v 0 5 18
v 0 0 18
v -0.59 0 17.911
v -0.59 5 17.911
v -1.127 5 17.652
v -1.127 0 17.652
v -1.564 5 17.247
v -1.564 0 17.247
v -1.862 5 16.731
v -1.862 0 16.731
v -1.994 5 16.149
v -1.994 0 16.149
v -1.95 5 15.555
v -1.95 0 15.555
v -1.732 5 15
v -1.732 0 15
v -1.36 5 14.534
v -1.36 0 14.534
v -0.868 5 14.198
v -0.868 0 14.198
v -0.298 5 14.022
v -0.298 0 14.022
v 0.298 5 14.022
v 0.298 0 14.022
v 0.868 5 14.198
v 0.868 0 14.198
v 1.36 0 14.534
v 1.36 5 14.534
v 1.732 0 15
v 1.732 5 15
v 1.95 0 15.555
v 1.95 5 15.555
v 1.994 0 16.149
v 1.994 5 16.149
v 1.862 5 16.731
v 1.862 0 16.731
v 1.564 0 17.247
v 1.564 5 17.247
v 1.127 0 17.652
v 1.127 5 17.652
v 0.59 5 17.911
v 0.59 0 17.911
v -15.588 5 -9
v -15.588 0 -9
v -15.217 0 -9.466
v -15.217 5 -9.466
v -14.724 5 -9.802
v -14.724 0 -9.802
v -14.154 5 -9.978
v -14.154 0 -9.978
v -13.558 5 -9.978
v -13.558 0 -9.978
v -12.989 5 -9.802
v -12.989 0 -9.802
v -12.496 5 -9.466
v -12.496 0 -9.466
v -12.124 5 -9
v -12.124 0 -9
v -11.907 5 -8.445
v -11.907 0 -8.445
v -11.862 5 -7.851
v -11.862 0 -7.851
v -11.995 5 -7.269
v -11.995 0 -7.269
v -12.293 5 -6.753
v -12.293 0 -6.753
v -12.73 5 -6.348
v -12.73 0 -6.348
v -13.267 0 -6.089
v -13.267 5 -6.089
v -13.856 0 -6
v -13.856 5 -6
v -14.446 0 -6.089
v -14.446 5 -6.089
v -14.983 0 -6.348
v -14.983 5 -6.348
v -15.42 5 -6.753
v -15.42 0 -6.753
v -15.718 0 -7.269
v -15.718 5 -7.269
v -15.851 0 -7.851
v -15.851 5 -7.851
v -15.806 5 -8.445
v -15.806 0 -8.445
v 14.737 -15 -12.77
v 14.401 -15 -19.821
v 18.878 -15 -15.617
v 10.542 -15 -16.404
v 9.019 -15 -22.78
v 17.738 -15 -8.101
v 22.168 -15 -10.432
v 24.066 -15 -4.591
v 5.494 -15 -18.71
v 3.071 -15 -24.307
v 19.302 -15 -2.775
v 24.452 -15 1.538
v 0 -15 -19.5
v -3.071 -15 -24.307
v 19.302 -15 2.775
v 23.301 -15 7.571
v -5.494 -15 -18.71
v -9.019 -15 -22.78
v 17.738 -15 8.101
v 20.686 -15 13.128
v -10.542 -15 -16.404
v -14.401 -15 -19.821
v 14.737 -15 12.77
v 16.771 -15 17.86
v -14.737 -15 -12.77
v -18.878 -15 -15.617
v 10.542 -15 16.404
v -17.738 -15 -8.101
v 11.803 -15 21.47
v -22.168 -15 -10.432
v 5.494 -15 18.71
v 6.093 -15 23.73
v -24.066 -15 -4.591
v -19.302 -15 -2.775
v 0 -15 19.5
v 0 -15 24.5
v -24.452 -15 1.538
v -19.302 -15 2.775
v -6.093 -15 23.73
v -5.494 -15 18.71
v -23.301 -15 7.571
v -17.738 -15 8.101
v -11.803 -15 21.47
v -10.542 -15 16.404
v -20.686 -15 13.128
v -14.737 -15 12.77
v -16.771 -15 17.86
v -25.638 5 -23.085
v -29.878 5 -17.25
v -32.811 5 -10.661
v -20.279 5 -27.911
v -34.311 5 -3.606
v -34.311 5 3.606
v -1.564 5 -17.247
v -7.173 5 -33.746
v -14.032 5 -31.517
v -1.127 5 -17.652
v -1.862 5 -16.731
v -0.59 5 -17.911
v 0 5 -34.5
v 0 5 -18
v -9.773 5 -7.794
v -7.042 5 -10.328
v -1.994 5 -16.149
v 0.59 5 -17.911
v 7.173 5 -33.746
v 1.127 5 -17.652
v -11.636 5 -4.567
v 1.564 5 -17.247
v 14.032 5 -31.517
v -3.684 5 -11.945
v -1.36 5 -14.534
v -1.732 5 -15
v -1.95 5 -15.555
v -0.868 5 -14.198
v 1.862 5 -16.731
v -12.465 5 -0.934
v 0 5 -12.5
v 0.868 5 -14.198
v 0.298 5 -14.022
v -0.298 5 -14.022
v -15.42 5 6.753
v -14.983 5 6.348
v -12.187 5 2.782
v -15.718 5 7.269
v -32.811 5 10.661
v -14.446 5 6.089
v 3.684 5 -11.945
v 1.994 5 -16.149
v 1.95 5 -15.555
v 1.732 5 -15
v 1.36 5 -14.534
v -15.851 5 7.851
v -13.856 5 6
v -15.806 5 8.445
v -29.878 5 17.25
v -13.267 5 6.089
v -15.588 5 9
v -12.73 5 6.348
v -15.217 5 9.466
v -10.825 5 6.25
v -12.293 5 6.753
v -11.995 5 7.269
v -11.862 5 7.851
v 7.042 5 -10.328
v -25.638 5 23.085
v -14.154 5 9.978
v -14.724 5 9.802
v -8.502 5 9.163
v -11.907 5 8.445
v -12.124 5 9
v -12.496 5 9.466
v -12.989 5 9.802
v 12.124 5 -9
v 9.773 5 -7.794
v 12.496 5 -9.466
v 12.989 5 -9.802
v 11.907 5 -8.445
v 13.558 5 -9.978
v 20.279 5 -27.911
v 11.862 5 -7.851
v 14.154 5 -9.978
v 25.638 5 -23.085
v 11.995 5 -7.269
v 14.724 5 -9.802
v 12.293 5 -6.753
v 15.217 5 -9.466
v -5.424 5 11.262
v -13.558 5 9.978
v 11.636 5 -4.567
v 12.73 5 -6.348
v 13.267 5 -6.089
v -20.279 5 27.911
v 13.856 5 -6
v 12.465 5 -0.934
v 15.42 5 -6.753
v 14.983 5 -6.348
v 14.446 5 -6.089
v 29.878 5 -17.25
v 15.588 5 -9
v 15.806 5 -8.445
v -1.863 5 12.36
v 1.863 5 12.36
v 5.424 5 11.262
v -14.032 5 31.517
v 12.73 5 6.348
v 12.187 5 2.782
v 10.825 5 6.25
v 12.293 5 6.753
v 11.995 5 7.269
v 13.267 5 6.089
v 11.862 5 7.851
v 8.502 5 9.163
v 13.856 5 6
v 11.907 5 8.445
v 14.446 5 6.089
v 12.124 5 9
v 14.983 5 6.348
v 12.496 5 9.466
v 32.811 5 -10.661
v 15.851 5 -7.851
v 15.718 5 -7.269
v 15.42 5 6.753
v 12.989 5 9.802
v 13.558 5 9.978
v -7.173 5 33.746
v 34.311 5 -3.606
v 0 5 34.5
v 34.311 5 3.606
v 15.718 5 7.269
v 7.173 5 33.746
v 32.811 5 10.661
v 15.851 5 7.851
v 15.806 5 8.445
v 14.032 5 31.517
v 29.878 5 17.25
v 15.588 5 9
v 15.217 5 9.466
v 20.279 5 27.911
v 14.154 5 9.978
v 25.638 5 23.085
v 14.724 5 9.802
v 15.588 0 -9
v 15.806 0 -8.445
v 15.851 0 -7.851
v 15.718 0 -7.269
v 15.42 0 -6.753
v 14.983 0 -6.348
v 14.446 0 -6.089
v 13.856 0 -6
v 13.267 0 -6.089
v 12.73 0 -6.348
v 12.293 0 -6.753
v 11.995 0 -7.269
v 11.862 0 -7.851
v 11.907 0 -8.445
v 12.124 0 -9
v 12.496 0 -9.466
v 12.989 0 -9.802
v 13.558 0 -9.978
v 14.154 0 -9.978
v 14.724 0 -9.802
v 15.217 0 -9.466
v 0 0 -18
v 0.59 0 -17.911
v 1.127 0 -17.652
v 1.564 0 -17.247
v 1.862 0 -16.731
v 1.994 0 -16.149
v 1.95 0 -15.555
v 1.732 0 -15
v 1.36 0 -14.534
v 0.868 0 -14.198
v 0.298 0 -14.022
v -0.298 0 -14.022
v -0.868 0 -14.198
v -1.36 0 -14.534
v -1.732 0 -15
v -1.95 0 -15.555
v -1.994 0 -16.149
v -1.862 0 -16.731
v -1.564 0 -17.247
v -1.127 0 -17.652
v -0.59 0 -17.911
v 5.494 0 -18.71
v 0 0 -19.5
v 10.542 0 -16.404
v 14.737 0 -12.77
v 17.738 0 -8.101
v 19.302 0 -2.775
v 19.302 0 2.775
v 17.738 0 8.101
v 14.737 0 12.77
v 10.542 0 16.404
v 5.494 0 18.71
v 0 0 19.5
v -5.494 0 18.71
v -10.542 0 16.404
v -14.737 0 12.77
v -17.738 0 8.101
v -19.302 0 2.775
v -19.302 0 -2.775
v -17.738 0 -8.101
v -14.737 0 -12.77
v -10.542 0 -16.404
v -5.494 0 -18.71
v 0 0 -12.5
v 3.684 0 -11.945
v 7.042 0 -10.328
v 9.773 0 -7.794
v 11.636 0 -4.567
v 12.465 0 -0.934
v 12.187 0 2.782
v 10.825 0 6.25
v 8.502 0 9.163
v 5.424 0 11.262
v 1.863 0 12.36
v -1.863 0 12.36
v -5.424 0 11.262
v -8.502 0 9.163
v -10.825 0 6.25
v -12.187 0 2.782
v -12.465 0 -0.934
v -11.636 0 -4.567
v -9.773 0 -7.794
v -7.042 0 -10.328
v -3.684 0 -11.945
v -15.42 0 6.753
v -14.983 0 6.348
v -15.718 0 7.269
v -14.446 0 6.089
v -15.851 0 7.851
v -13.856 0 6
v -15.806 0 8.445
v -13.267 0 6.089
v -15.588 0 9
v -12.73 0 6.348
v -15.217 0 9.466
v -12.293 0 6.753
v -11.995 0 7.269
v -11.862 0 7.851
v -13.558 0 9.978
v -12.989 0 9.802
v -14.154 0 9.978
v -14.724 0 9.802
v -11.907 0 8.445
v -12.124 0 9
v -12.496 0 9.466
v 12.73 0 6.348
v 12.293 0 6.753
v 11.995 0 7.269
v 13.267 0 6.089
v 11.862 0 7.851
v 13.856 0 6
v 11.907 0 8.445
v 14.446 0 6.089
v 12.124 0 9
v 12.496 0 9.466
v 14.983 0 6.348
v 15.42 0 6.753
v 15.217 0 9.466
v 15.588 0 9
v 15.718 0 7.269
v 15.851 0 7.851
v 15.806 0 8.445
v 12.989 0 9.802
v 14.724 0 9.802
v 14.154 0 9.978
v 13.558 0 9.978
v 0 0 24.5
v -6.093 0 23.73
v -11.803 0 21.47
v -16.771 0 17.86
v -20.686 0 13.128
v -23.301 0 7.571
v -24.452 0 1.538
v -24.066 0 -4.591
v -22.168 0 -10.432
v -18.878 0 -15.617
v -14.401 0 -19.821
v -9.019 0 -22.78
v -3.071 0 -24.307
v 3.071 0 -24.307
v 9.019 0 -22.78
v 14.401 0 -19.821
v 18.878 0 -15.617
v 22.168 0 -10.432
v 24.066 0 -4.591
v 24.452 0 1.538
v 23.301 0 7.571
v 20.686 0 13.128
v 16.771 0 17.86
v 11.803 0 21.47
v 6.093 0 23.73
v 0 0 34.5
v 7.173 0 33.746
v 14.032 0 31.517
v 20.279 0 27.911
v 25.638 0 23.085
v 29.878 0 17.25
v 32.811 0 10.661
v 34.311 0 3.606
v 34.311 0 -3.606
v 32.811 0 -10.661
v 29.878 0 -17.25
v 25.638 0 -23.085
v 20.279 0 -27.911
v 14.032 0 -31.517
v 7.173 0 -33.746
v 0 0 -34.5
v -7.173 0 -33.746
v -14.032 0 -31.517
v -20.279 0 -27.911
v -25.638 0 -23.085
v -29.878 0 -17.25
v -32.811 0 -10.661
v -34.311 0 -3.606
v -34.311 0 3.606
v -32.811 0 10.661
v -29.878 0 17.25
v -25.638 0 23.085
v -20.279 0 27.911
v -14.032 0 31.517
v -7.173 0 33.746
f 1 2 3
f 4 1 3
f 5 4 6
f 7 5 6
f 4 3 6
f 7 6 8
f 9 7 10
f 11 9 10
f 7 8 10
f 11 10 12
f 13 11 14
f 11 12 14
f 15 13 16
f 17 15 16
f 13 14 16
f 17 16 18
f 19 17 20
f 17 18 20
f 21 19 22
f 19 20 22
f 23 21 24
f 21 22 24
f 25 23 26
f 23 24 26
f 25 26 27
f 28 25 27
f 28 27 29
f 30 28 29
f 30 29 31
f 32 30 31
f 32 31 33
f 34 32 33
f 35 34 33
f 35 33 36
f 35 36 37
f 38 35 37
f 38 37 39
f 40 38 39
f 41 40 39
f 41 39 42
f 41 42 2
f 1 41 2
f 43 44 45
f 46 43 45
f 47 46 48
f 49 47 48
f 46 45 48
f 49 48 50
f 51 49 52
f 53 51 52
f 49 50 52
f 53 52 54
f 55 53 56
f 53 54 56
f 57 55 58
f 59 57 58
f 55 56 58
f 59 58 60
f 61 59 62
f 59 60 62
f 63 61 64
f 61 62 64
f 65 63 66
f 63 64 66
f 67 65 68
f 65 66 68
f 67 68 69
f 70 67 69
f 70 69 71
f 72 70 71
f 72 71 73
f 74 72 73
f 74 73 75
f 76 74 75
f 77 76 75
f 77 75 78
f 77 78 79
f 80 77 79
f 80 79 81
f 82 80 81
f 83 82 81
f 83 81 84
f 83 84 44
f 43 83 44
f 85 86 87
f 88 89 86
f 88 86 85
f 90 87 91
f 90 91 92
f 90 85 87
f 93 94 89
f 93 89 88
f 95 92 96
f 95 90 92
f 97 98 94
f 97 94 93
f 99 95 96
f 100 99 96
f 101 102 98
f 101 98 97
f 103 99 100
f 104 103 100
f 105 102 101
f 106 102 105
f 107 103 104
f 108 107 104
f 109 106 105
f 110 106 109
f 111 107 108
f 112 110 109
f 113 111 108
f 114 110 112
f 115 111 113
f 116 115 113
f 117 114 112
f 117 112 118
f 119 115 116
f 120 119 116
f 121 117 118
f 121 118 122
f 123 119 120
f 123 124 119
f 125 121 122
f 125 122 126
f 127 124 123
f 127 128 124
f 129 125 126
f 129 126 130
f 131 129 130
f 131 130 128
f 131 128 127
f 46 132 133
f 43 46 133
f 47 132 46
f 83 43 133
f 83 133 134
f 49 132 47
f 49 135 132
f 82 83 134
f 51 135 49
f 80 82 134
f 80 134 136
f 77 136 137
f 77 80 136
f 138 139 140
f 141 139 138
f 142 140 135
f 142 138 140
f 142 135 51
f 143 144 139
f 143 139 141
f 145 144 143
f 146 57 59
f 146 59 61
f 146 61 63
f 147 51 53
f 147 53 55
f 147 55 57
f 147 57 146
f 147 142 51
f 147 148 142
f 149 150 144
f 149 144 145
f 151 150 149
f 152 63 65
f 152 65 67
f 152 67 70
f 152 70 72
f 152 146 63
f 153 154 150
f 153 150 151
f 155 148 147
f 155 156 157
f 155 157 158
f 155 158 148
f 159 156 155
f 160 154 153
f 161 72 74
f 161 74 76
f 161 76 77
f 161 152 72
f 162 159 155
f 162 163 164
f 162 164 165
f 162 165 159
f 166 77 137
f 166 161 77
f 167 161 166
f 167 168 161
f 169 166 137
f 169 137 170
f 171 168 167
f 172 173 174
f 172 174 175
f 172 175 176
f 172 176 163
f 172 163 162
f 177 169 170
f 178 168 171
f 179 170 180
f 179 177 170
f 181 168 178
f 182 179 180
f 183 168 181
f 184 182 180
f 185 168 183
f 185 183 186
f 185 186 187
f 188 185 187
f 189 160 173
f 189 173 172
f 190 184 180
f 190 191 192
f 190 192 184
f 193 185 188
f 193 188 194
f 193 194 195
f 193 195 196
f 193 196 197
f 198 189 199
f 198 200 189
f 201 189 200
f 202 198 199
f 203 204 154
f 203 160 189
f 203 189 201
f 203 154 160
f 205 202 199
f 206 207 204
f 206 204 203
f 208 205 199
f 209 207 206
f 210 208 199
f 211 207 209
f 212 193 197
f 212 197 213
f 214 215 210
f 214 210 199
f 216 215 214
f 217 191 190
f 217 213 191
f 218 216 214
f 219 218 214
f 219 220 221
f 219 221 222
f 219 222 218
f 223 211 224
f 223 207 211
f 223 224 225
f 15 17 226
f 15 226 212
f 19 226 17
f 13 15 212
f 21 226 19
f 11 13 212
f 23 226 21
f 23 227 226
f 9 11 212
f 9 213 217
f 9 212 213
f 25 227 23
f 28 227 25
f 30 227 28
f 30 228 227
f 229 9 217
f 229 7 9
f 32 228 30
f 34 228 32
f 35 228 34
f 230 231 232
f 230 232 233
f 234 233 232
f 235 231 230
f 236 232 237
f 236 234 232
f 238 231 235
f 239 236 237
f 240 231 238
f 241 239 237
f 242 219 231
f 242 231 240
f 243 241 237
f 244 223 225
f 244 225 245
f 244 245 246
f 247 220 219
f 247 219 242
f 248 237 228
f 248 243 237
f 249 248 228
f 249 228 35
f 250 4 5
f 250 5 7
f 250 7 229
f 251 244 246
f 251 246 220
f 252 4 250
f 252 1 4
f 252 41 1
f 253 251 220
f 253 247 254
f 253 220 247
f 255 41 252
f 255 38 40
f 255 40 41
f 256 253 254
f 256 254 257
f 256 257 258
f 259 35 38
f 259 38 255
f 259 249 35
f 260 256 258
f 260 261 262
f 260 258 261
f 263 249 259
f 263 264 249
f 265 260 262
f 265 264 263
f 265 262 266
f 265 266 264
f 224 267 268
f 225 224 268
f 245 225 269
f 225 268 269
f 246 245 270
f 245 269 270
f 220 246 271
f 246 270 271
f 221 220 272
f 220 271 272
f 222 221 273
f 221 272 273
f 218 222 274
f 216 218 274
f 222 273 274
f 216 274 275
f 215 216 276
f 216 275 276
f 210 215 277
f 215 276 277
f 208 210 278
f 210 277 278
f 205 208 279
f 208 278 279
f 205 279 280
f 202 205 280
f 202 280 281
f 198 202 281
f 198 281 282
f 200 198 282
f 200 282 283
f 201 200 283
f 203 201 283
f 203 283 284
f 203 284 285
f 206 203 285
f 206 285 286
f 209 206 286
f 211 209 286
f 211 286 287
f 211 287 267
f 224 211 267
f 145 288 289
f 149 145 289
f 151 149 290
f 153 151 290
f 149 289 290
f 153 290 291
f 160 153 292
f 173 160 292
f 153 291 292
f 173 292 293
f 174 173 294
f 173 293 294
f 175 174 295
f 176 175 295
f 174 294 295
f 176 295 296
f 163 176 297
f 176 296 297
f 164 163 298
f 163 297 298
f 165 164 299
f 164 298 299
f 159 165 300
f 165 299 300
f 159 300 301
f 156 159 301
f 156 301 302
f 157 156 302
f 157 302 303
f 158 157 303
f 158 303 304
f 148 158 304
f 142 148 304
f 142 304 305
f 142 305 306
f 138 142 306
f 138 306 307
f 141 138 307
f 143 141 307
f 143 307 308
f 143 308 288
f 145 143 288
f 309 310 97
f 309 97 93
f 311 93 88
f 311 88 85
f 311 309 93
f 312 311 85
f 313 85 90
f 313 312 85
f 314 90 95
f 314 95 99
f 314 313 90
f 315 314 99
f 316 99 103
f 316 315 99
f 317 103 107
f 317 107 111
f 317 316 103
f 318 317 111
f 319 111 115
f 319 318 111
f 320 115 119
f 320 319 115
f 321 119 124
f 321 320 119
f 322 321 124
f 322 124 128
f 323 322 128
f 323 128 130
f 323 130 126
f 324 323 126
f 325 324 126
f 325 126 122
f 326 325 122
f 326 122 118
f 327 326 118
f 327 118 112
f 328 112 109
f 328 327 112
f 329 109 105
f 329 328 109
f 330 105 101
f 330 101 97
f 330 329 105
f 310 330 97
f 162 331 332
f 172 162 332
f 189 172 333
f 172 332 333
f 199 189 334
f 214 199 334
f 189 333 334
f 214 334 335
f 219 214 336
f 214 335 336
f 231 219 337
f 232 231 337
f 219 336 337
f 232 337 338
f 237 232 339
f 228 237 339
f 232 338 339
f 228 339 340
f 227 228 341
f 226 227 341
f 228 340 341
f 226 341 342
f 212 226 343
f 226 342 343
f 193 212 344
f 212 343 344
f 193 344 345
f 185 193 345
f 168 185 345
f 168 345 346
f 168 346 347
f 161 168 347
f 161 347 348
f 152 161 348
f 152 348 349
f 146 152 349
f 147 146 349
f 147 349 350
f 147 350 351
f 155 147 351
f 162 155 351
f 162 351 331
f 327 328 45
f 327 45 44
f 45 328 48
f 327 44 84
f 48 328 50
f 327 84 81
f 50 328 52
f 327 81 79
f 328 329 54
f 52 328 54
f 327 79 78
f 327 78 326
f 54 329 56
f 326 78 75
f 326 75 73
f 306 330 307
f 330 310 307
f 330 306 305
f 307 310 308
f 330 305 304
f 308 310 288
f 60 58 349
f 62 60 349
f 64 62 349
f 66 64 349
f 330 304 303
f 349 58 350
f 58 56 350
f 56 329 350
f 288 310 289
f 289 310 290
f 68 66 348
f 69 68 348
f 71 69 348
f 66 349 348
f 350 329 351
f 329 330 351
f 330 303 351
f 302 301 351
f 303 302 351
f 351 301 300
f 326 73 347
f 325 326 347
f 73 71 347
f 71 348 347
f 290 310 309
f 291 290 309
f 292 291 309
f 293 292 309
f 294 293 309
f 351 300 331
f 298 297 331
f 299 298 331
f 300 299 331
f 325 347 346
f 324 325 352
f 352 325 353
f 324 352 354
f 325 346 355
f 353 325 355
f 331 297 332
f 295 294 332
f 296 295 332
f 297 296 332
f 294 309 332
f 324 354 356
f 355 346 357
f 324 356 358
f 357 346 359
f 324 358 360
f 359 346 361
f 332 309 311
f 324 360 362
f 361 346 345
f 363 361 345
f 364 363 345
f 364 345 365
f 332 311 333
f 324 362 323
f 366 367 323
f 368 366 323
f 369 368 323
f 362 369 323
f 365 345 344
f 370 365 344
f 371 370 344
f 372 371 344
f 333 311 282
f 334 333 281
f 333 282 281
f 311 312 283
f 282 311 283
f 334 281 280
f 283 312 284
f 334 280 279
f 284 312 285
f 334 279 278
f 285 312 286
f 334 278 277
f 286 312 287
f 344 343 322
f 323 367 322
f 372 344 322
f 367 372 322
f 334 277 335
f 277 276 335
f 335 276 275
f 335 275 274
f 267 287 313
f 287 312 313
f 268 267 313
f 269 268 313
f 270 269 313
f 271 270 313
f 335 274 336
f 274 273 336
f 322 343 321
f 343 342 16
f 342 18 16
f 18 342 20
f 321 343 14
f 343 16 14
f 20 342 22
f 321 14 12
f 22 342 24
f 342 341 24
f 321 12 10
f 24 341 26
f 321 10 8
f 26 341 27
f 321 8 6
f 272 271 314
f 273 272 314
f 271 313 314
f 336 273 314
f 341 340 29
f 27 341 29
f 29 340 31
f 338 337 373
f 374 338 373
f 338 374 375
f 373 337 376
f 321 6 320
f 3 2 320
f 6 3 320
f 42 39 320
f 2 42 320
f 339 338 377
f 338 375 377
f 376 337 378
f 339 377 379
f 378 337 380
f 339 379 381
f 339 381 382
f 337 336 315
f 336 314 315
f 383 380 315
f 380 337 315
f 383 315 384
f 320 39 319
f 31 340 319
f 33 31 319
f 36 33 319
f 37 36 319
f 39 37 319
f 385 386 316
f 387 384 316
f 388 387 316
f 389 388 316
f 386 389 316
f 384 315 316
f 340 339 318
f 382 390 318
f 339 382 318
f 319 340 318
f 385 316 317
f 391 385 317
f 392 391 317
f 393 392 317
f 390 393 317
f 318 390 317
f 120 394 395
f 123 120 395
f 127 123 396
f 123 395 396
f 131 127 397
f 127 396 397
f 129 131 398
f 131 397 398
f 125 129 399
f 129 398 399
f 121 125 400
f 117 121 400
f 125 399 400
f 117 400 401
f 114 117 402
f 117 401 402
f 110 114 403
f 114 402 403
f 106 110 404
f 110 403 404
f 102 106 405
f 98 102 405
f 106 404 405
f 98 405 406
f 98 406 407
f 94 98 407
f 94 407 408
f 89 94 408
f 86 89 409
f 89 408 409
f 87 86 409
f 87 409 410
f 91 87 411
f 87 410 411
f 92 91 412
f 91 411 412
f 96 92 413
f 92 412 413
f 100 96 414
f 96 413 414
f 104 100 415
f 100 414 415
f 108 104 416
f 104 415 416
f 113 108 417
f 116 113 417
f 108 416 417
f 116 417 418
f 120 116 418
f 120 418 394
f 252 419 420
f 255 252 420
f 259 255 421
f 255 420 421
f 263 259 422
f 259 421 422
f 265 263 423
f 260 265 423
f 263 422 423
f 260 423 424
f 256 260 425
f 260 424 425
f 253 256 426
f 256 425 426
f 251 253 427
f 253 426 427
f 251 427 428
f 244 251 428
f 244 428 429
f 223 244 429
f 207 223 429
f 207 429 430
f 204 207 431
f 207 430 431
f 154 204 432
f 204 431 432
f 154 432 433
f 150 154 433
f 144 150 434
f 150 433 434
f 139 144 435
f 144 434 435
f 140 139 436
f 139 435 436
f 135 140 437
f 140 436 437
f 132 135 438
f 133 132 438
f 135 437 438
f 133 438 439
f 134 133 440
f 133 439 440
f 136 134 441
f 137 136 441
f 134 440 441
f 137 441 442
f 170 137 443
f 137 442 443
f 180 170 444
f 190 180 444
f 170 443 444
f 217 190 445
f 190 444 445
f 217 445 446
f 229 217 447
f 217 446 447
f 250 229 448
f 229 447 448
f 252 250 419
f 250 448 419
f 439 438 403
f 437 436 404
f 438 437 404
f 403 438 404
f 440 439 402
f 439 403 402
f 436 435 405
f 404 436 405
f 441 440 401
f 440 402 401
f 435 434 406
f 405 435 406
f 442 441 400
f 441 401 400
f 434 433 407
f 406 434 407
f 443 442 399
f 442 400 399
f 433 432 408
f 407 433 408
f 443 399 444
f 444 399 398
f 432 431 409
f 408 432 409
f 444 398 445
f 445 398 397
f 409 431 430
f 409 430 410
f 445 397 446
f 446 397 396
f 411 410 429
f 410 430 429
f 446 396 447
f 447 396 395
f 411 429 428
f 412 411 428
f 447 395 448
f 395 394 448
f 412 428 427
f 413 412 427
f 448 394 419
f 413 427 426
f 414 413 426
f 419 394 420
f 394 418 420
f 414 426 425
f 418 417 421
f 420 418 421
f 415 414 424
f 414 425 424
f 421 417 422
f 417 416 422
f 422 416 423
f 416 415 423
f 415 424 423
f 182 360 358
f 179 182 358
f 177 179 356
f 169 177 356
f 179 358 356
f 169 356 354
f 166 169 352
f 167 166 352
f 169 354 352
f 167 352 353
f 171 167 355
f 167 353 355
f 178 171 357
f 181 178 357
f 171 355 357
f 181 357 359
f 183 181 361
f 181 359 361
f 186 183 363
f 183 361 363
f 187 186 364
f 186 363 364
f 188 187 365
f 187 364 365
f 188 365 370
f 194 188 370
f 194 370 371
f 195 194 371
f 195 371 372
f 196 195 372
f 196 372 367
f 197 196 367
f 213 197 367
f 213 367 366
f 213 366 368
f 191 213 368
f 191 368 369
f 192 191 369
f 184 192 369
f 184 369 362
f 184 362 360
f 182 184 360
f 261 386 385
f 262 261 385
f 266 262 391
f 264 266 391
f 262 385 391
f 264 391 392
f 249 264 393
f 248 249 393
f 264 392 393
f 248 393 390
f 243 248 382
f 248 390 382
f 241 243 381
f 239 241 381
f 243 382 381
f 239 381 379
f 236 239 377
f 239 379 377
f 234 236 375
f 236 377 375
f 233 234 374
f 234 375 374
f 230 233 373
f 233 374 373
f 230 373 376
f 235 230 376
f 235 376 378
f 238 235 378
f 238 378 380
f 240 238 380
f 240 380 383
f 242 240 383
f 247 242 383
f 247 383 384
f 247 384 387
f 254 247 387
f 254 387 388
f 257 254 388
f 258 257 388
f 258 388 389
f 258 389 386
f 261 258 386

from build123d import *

# Parameters (mm, degrees)
CROQUIS1_R              = 34.5
SALIENTE_EXTRUIR1_DEPTH = 5
CROQUIS2_R              = 24.5
CROQUIS2_R_2            = 19.5
SALIENTE_EXTRUIR2_DEPTH = 15
CROQUIS5_R              = 12.5
CORTAR_EXTRUIR2_DEPTH   = 52.044098582
CROQUIS7_R              = 2
CORTAR_EXTRUIR3_DEPTH   = 52.044098582
MATRIZC1_COUNT          = 6


with BuildPart() as part:
    # Croquis1 → Saliente-Extruir1 (new body)
    with BuildSketch(Plane(origin=(0, 0, 0), x_dir=(1, 0, 0), z_dir=(0, 1, 0))):
        with Locations(Location((0, 0, 0), (0, 0, 270))):
            Circle(CROQUIS1_R)
    extrude(amount=SALIENTE_EXTRUIR1_DEPTH)

    # Croquis2 → Saliente-Extruir2 (add)
    with BuildSketch(Plane.XZ):
        with Locations(Location((0, 0, 0), (0, 0, 90))):
            Circle(CROQUIS2_R)
        with Locations(Location((0, 0, 0), (0, 0, 270))):
            Circle(CROQUIS2_R_2, mode=Mode.SUBTRACT)
    extrude(amount=SALIENTE_EXTRUIR2_DEPTH)

    # Croquis5 → Cortar-Extruir2 (cut, through all)
    with BuildSketch(Plane.XZ):
        with Locations(Location((0, 0, 0), (0, 0, 270))):
            Circle(CROQUIS5_R)
    extrude(amount=-CORTAR_EXTRUIR2_DEPTH, mode=Mode.SUBTRACT)

    # Croquis7 → Cortar-Extruir3 (cut, through all)
    with BuildSketch(Plane.XZ):
        with Locations(Location((0, -16, 0), (0, 0, 270))):
            Circle(CROQUIS7_R)
    cortar_extruir3 = extrude(amount=-CORTAR_EXTRUIR3_DEPTH, mode=Mode.SUBTRACT)

    # MatrizC1: Cortar-Extruir3 ×6 about axis
    matrizc1_axis = Axis((0, 0, 0), (0, 1, 0))
    for i in range(1, MATRIZC1_COUNT):
        add(cortar_extruir3.rotate(matrizc1_axis, i * 360 / MATRIZC1_COUNT), mode=Mode.SUBTRACT)


solid = part.part
